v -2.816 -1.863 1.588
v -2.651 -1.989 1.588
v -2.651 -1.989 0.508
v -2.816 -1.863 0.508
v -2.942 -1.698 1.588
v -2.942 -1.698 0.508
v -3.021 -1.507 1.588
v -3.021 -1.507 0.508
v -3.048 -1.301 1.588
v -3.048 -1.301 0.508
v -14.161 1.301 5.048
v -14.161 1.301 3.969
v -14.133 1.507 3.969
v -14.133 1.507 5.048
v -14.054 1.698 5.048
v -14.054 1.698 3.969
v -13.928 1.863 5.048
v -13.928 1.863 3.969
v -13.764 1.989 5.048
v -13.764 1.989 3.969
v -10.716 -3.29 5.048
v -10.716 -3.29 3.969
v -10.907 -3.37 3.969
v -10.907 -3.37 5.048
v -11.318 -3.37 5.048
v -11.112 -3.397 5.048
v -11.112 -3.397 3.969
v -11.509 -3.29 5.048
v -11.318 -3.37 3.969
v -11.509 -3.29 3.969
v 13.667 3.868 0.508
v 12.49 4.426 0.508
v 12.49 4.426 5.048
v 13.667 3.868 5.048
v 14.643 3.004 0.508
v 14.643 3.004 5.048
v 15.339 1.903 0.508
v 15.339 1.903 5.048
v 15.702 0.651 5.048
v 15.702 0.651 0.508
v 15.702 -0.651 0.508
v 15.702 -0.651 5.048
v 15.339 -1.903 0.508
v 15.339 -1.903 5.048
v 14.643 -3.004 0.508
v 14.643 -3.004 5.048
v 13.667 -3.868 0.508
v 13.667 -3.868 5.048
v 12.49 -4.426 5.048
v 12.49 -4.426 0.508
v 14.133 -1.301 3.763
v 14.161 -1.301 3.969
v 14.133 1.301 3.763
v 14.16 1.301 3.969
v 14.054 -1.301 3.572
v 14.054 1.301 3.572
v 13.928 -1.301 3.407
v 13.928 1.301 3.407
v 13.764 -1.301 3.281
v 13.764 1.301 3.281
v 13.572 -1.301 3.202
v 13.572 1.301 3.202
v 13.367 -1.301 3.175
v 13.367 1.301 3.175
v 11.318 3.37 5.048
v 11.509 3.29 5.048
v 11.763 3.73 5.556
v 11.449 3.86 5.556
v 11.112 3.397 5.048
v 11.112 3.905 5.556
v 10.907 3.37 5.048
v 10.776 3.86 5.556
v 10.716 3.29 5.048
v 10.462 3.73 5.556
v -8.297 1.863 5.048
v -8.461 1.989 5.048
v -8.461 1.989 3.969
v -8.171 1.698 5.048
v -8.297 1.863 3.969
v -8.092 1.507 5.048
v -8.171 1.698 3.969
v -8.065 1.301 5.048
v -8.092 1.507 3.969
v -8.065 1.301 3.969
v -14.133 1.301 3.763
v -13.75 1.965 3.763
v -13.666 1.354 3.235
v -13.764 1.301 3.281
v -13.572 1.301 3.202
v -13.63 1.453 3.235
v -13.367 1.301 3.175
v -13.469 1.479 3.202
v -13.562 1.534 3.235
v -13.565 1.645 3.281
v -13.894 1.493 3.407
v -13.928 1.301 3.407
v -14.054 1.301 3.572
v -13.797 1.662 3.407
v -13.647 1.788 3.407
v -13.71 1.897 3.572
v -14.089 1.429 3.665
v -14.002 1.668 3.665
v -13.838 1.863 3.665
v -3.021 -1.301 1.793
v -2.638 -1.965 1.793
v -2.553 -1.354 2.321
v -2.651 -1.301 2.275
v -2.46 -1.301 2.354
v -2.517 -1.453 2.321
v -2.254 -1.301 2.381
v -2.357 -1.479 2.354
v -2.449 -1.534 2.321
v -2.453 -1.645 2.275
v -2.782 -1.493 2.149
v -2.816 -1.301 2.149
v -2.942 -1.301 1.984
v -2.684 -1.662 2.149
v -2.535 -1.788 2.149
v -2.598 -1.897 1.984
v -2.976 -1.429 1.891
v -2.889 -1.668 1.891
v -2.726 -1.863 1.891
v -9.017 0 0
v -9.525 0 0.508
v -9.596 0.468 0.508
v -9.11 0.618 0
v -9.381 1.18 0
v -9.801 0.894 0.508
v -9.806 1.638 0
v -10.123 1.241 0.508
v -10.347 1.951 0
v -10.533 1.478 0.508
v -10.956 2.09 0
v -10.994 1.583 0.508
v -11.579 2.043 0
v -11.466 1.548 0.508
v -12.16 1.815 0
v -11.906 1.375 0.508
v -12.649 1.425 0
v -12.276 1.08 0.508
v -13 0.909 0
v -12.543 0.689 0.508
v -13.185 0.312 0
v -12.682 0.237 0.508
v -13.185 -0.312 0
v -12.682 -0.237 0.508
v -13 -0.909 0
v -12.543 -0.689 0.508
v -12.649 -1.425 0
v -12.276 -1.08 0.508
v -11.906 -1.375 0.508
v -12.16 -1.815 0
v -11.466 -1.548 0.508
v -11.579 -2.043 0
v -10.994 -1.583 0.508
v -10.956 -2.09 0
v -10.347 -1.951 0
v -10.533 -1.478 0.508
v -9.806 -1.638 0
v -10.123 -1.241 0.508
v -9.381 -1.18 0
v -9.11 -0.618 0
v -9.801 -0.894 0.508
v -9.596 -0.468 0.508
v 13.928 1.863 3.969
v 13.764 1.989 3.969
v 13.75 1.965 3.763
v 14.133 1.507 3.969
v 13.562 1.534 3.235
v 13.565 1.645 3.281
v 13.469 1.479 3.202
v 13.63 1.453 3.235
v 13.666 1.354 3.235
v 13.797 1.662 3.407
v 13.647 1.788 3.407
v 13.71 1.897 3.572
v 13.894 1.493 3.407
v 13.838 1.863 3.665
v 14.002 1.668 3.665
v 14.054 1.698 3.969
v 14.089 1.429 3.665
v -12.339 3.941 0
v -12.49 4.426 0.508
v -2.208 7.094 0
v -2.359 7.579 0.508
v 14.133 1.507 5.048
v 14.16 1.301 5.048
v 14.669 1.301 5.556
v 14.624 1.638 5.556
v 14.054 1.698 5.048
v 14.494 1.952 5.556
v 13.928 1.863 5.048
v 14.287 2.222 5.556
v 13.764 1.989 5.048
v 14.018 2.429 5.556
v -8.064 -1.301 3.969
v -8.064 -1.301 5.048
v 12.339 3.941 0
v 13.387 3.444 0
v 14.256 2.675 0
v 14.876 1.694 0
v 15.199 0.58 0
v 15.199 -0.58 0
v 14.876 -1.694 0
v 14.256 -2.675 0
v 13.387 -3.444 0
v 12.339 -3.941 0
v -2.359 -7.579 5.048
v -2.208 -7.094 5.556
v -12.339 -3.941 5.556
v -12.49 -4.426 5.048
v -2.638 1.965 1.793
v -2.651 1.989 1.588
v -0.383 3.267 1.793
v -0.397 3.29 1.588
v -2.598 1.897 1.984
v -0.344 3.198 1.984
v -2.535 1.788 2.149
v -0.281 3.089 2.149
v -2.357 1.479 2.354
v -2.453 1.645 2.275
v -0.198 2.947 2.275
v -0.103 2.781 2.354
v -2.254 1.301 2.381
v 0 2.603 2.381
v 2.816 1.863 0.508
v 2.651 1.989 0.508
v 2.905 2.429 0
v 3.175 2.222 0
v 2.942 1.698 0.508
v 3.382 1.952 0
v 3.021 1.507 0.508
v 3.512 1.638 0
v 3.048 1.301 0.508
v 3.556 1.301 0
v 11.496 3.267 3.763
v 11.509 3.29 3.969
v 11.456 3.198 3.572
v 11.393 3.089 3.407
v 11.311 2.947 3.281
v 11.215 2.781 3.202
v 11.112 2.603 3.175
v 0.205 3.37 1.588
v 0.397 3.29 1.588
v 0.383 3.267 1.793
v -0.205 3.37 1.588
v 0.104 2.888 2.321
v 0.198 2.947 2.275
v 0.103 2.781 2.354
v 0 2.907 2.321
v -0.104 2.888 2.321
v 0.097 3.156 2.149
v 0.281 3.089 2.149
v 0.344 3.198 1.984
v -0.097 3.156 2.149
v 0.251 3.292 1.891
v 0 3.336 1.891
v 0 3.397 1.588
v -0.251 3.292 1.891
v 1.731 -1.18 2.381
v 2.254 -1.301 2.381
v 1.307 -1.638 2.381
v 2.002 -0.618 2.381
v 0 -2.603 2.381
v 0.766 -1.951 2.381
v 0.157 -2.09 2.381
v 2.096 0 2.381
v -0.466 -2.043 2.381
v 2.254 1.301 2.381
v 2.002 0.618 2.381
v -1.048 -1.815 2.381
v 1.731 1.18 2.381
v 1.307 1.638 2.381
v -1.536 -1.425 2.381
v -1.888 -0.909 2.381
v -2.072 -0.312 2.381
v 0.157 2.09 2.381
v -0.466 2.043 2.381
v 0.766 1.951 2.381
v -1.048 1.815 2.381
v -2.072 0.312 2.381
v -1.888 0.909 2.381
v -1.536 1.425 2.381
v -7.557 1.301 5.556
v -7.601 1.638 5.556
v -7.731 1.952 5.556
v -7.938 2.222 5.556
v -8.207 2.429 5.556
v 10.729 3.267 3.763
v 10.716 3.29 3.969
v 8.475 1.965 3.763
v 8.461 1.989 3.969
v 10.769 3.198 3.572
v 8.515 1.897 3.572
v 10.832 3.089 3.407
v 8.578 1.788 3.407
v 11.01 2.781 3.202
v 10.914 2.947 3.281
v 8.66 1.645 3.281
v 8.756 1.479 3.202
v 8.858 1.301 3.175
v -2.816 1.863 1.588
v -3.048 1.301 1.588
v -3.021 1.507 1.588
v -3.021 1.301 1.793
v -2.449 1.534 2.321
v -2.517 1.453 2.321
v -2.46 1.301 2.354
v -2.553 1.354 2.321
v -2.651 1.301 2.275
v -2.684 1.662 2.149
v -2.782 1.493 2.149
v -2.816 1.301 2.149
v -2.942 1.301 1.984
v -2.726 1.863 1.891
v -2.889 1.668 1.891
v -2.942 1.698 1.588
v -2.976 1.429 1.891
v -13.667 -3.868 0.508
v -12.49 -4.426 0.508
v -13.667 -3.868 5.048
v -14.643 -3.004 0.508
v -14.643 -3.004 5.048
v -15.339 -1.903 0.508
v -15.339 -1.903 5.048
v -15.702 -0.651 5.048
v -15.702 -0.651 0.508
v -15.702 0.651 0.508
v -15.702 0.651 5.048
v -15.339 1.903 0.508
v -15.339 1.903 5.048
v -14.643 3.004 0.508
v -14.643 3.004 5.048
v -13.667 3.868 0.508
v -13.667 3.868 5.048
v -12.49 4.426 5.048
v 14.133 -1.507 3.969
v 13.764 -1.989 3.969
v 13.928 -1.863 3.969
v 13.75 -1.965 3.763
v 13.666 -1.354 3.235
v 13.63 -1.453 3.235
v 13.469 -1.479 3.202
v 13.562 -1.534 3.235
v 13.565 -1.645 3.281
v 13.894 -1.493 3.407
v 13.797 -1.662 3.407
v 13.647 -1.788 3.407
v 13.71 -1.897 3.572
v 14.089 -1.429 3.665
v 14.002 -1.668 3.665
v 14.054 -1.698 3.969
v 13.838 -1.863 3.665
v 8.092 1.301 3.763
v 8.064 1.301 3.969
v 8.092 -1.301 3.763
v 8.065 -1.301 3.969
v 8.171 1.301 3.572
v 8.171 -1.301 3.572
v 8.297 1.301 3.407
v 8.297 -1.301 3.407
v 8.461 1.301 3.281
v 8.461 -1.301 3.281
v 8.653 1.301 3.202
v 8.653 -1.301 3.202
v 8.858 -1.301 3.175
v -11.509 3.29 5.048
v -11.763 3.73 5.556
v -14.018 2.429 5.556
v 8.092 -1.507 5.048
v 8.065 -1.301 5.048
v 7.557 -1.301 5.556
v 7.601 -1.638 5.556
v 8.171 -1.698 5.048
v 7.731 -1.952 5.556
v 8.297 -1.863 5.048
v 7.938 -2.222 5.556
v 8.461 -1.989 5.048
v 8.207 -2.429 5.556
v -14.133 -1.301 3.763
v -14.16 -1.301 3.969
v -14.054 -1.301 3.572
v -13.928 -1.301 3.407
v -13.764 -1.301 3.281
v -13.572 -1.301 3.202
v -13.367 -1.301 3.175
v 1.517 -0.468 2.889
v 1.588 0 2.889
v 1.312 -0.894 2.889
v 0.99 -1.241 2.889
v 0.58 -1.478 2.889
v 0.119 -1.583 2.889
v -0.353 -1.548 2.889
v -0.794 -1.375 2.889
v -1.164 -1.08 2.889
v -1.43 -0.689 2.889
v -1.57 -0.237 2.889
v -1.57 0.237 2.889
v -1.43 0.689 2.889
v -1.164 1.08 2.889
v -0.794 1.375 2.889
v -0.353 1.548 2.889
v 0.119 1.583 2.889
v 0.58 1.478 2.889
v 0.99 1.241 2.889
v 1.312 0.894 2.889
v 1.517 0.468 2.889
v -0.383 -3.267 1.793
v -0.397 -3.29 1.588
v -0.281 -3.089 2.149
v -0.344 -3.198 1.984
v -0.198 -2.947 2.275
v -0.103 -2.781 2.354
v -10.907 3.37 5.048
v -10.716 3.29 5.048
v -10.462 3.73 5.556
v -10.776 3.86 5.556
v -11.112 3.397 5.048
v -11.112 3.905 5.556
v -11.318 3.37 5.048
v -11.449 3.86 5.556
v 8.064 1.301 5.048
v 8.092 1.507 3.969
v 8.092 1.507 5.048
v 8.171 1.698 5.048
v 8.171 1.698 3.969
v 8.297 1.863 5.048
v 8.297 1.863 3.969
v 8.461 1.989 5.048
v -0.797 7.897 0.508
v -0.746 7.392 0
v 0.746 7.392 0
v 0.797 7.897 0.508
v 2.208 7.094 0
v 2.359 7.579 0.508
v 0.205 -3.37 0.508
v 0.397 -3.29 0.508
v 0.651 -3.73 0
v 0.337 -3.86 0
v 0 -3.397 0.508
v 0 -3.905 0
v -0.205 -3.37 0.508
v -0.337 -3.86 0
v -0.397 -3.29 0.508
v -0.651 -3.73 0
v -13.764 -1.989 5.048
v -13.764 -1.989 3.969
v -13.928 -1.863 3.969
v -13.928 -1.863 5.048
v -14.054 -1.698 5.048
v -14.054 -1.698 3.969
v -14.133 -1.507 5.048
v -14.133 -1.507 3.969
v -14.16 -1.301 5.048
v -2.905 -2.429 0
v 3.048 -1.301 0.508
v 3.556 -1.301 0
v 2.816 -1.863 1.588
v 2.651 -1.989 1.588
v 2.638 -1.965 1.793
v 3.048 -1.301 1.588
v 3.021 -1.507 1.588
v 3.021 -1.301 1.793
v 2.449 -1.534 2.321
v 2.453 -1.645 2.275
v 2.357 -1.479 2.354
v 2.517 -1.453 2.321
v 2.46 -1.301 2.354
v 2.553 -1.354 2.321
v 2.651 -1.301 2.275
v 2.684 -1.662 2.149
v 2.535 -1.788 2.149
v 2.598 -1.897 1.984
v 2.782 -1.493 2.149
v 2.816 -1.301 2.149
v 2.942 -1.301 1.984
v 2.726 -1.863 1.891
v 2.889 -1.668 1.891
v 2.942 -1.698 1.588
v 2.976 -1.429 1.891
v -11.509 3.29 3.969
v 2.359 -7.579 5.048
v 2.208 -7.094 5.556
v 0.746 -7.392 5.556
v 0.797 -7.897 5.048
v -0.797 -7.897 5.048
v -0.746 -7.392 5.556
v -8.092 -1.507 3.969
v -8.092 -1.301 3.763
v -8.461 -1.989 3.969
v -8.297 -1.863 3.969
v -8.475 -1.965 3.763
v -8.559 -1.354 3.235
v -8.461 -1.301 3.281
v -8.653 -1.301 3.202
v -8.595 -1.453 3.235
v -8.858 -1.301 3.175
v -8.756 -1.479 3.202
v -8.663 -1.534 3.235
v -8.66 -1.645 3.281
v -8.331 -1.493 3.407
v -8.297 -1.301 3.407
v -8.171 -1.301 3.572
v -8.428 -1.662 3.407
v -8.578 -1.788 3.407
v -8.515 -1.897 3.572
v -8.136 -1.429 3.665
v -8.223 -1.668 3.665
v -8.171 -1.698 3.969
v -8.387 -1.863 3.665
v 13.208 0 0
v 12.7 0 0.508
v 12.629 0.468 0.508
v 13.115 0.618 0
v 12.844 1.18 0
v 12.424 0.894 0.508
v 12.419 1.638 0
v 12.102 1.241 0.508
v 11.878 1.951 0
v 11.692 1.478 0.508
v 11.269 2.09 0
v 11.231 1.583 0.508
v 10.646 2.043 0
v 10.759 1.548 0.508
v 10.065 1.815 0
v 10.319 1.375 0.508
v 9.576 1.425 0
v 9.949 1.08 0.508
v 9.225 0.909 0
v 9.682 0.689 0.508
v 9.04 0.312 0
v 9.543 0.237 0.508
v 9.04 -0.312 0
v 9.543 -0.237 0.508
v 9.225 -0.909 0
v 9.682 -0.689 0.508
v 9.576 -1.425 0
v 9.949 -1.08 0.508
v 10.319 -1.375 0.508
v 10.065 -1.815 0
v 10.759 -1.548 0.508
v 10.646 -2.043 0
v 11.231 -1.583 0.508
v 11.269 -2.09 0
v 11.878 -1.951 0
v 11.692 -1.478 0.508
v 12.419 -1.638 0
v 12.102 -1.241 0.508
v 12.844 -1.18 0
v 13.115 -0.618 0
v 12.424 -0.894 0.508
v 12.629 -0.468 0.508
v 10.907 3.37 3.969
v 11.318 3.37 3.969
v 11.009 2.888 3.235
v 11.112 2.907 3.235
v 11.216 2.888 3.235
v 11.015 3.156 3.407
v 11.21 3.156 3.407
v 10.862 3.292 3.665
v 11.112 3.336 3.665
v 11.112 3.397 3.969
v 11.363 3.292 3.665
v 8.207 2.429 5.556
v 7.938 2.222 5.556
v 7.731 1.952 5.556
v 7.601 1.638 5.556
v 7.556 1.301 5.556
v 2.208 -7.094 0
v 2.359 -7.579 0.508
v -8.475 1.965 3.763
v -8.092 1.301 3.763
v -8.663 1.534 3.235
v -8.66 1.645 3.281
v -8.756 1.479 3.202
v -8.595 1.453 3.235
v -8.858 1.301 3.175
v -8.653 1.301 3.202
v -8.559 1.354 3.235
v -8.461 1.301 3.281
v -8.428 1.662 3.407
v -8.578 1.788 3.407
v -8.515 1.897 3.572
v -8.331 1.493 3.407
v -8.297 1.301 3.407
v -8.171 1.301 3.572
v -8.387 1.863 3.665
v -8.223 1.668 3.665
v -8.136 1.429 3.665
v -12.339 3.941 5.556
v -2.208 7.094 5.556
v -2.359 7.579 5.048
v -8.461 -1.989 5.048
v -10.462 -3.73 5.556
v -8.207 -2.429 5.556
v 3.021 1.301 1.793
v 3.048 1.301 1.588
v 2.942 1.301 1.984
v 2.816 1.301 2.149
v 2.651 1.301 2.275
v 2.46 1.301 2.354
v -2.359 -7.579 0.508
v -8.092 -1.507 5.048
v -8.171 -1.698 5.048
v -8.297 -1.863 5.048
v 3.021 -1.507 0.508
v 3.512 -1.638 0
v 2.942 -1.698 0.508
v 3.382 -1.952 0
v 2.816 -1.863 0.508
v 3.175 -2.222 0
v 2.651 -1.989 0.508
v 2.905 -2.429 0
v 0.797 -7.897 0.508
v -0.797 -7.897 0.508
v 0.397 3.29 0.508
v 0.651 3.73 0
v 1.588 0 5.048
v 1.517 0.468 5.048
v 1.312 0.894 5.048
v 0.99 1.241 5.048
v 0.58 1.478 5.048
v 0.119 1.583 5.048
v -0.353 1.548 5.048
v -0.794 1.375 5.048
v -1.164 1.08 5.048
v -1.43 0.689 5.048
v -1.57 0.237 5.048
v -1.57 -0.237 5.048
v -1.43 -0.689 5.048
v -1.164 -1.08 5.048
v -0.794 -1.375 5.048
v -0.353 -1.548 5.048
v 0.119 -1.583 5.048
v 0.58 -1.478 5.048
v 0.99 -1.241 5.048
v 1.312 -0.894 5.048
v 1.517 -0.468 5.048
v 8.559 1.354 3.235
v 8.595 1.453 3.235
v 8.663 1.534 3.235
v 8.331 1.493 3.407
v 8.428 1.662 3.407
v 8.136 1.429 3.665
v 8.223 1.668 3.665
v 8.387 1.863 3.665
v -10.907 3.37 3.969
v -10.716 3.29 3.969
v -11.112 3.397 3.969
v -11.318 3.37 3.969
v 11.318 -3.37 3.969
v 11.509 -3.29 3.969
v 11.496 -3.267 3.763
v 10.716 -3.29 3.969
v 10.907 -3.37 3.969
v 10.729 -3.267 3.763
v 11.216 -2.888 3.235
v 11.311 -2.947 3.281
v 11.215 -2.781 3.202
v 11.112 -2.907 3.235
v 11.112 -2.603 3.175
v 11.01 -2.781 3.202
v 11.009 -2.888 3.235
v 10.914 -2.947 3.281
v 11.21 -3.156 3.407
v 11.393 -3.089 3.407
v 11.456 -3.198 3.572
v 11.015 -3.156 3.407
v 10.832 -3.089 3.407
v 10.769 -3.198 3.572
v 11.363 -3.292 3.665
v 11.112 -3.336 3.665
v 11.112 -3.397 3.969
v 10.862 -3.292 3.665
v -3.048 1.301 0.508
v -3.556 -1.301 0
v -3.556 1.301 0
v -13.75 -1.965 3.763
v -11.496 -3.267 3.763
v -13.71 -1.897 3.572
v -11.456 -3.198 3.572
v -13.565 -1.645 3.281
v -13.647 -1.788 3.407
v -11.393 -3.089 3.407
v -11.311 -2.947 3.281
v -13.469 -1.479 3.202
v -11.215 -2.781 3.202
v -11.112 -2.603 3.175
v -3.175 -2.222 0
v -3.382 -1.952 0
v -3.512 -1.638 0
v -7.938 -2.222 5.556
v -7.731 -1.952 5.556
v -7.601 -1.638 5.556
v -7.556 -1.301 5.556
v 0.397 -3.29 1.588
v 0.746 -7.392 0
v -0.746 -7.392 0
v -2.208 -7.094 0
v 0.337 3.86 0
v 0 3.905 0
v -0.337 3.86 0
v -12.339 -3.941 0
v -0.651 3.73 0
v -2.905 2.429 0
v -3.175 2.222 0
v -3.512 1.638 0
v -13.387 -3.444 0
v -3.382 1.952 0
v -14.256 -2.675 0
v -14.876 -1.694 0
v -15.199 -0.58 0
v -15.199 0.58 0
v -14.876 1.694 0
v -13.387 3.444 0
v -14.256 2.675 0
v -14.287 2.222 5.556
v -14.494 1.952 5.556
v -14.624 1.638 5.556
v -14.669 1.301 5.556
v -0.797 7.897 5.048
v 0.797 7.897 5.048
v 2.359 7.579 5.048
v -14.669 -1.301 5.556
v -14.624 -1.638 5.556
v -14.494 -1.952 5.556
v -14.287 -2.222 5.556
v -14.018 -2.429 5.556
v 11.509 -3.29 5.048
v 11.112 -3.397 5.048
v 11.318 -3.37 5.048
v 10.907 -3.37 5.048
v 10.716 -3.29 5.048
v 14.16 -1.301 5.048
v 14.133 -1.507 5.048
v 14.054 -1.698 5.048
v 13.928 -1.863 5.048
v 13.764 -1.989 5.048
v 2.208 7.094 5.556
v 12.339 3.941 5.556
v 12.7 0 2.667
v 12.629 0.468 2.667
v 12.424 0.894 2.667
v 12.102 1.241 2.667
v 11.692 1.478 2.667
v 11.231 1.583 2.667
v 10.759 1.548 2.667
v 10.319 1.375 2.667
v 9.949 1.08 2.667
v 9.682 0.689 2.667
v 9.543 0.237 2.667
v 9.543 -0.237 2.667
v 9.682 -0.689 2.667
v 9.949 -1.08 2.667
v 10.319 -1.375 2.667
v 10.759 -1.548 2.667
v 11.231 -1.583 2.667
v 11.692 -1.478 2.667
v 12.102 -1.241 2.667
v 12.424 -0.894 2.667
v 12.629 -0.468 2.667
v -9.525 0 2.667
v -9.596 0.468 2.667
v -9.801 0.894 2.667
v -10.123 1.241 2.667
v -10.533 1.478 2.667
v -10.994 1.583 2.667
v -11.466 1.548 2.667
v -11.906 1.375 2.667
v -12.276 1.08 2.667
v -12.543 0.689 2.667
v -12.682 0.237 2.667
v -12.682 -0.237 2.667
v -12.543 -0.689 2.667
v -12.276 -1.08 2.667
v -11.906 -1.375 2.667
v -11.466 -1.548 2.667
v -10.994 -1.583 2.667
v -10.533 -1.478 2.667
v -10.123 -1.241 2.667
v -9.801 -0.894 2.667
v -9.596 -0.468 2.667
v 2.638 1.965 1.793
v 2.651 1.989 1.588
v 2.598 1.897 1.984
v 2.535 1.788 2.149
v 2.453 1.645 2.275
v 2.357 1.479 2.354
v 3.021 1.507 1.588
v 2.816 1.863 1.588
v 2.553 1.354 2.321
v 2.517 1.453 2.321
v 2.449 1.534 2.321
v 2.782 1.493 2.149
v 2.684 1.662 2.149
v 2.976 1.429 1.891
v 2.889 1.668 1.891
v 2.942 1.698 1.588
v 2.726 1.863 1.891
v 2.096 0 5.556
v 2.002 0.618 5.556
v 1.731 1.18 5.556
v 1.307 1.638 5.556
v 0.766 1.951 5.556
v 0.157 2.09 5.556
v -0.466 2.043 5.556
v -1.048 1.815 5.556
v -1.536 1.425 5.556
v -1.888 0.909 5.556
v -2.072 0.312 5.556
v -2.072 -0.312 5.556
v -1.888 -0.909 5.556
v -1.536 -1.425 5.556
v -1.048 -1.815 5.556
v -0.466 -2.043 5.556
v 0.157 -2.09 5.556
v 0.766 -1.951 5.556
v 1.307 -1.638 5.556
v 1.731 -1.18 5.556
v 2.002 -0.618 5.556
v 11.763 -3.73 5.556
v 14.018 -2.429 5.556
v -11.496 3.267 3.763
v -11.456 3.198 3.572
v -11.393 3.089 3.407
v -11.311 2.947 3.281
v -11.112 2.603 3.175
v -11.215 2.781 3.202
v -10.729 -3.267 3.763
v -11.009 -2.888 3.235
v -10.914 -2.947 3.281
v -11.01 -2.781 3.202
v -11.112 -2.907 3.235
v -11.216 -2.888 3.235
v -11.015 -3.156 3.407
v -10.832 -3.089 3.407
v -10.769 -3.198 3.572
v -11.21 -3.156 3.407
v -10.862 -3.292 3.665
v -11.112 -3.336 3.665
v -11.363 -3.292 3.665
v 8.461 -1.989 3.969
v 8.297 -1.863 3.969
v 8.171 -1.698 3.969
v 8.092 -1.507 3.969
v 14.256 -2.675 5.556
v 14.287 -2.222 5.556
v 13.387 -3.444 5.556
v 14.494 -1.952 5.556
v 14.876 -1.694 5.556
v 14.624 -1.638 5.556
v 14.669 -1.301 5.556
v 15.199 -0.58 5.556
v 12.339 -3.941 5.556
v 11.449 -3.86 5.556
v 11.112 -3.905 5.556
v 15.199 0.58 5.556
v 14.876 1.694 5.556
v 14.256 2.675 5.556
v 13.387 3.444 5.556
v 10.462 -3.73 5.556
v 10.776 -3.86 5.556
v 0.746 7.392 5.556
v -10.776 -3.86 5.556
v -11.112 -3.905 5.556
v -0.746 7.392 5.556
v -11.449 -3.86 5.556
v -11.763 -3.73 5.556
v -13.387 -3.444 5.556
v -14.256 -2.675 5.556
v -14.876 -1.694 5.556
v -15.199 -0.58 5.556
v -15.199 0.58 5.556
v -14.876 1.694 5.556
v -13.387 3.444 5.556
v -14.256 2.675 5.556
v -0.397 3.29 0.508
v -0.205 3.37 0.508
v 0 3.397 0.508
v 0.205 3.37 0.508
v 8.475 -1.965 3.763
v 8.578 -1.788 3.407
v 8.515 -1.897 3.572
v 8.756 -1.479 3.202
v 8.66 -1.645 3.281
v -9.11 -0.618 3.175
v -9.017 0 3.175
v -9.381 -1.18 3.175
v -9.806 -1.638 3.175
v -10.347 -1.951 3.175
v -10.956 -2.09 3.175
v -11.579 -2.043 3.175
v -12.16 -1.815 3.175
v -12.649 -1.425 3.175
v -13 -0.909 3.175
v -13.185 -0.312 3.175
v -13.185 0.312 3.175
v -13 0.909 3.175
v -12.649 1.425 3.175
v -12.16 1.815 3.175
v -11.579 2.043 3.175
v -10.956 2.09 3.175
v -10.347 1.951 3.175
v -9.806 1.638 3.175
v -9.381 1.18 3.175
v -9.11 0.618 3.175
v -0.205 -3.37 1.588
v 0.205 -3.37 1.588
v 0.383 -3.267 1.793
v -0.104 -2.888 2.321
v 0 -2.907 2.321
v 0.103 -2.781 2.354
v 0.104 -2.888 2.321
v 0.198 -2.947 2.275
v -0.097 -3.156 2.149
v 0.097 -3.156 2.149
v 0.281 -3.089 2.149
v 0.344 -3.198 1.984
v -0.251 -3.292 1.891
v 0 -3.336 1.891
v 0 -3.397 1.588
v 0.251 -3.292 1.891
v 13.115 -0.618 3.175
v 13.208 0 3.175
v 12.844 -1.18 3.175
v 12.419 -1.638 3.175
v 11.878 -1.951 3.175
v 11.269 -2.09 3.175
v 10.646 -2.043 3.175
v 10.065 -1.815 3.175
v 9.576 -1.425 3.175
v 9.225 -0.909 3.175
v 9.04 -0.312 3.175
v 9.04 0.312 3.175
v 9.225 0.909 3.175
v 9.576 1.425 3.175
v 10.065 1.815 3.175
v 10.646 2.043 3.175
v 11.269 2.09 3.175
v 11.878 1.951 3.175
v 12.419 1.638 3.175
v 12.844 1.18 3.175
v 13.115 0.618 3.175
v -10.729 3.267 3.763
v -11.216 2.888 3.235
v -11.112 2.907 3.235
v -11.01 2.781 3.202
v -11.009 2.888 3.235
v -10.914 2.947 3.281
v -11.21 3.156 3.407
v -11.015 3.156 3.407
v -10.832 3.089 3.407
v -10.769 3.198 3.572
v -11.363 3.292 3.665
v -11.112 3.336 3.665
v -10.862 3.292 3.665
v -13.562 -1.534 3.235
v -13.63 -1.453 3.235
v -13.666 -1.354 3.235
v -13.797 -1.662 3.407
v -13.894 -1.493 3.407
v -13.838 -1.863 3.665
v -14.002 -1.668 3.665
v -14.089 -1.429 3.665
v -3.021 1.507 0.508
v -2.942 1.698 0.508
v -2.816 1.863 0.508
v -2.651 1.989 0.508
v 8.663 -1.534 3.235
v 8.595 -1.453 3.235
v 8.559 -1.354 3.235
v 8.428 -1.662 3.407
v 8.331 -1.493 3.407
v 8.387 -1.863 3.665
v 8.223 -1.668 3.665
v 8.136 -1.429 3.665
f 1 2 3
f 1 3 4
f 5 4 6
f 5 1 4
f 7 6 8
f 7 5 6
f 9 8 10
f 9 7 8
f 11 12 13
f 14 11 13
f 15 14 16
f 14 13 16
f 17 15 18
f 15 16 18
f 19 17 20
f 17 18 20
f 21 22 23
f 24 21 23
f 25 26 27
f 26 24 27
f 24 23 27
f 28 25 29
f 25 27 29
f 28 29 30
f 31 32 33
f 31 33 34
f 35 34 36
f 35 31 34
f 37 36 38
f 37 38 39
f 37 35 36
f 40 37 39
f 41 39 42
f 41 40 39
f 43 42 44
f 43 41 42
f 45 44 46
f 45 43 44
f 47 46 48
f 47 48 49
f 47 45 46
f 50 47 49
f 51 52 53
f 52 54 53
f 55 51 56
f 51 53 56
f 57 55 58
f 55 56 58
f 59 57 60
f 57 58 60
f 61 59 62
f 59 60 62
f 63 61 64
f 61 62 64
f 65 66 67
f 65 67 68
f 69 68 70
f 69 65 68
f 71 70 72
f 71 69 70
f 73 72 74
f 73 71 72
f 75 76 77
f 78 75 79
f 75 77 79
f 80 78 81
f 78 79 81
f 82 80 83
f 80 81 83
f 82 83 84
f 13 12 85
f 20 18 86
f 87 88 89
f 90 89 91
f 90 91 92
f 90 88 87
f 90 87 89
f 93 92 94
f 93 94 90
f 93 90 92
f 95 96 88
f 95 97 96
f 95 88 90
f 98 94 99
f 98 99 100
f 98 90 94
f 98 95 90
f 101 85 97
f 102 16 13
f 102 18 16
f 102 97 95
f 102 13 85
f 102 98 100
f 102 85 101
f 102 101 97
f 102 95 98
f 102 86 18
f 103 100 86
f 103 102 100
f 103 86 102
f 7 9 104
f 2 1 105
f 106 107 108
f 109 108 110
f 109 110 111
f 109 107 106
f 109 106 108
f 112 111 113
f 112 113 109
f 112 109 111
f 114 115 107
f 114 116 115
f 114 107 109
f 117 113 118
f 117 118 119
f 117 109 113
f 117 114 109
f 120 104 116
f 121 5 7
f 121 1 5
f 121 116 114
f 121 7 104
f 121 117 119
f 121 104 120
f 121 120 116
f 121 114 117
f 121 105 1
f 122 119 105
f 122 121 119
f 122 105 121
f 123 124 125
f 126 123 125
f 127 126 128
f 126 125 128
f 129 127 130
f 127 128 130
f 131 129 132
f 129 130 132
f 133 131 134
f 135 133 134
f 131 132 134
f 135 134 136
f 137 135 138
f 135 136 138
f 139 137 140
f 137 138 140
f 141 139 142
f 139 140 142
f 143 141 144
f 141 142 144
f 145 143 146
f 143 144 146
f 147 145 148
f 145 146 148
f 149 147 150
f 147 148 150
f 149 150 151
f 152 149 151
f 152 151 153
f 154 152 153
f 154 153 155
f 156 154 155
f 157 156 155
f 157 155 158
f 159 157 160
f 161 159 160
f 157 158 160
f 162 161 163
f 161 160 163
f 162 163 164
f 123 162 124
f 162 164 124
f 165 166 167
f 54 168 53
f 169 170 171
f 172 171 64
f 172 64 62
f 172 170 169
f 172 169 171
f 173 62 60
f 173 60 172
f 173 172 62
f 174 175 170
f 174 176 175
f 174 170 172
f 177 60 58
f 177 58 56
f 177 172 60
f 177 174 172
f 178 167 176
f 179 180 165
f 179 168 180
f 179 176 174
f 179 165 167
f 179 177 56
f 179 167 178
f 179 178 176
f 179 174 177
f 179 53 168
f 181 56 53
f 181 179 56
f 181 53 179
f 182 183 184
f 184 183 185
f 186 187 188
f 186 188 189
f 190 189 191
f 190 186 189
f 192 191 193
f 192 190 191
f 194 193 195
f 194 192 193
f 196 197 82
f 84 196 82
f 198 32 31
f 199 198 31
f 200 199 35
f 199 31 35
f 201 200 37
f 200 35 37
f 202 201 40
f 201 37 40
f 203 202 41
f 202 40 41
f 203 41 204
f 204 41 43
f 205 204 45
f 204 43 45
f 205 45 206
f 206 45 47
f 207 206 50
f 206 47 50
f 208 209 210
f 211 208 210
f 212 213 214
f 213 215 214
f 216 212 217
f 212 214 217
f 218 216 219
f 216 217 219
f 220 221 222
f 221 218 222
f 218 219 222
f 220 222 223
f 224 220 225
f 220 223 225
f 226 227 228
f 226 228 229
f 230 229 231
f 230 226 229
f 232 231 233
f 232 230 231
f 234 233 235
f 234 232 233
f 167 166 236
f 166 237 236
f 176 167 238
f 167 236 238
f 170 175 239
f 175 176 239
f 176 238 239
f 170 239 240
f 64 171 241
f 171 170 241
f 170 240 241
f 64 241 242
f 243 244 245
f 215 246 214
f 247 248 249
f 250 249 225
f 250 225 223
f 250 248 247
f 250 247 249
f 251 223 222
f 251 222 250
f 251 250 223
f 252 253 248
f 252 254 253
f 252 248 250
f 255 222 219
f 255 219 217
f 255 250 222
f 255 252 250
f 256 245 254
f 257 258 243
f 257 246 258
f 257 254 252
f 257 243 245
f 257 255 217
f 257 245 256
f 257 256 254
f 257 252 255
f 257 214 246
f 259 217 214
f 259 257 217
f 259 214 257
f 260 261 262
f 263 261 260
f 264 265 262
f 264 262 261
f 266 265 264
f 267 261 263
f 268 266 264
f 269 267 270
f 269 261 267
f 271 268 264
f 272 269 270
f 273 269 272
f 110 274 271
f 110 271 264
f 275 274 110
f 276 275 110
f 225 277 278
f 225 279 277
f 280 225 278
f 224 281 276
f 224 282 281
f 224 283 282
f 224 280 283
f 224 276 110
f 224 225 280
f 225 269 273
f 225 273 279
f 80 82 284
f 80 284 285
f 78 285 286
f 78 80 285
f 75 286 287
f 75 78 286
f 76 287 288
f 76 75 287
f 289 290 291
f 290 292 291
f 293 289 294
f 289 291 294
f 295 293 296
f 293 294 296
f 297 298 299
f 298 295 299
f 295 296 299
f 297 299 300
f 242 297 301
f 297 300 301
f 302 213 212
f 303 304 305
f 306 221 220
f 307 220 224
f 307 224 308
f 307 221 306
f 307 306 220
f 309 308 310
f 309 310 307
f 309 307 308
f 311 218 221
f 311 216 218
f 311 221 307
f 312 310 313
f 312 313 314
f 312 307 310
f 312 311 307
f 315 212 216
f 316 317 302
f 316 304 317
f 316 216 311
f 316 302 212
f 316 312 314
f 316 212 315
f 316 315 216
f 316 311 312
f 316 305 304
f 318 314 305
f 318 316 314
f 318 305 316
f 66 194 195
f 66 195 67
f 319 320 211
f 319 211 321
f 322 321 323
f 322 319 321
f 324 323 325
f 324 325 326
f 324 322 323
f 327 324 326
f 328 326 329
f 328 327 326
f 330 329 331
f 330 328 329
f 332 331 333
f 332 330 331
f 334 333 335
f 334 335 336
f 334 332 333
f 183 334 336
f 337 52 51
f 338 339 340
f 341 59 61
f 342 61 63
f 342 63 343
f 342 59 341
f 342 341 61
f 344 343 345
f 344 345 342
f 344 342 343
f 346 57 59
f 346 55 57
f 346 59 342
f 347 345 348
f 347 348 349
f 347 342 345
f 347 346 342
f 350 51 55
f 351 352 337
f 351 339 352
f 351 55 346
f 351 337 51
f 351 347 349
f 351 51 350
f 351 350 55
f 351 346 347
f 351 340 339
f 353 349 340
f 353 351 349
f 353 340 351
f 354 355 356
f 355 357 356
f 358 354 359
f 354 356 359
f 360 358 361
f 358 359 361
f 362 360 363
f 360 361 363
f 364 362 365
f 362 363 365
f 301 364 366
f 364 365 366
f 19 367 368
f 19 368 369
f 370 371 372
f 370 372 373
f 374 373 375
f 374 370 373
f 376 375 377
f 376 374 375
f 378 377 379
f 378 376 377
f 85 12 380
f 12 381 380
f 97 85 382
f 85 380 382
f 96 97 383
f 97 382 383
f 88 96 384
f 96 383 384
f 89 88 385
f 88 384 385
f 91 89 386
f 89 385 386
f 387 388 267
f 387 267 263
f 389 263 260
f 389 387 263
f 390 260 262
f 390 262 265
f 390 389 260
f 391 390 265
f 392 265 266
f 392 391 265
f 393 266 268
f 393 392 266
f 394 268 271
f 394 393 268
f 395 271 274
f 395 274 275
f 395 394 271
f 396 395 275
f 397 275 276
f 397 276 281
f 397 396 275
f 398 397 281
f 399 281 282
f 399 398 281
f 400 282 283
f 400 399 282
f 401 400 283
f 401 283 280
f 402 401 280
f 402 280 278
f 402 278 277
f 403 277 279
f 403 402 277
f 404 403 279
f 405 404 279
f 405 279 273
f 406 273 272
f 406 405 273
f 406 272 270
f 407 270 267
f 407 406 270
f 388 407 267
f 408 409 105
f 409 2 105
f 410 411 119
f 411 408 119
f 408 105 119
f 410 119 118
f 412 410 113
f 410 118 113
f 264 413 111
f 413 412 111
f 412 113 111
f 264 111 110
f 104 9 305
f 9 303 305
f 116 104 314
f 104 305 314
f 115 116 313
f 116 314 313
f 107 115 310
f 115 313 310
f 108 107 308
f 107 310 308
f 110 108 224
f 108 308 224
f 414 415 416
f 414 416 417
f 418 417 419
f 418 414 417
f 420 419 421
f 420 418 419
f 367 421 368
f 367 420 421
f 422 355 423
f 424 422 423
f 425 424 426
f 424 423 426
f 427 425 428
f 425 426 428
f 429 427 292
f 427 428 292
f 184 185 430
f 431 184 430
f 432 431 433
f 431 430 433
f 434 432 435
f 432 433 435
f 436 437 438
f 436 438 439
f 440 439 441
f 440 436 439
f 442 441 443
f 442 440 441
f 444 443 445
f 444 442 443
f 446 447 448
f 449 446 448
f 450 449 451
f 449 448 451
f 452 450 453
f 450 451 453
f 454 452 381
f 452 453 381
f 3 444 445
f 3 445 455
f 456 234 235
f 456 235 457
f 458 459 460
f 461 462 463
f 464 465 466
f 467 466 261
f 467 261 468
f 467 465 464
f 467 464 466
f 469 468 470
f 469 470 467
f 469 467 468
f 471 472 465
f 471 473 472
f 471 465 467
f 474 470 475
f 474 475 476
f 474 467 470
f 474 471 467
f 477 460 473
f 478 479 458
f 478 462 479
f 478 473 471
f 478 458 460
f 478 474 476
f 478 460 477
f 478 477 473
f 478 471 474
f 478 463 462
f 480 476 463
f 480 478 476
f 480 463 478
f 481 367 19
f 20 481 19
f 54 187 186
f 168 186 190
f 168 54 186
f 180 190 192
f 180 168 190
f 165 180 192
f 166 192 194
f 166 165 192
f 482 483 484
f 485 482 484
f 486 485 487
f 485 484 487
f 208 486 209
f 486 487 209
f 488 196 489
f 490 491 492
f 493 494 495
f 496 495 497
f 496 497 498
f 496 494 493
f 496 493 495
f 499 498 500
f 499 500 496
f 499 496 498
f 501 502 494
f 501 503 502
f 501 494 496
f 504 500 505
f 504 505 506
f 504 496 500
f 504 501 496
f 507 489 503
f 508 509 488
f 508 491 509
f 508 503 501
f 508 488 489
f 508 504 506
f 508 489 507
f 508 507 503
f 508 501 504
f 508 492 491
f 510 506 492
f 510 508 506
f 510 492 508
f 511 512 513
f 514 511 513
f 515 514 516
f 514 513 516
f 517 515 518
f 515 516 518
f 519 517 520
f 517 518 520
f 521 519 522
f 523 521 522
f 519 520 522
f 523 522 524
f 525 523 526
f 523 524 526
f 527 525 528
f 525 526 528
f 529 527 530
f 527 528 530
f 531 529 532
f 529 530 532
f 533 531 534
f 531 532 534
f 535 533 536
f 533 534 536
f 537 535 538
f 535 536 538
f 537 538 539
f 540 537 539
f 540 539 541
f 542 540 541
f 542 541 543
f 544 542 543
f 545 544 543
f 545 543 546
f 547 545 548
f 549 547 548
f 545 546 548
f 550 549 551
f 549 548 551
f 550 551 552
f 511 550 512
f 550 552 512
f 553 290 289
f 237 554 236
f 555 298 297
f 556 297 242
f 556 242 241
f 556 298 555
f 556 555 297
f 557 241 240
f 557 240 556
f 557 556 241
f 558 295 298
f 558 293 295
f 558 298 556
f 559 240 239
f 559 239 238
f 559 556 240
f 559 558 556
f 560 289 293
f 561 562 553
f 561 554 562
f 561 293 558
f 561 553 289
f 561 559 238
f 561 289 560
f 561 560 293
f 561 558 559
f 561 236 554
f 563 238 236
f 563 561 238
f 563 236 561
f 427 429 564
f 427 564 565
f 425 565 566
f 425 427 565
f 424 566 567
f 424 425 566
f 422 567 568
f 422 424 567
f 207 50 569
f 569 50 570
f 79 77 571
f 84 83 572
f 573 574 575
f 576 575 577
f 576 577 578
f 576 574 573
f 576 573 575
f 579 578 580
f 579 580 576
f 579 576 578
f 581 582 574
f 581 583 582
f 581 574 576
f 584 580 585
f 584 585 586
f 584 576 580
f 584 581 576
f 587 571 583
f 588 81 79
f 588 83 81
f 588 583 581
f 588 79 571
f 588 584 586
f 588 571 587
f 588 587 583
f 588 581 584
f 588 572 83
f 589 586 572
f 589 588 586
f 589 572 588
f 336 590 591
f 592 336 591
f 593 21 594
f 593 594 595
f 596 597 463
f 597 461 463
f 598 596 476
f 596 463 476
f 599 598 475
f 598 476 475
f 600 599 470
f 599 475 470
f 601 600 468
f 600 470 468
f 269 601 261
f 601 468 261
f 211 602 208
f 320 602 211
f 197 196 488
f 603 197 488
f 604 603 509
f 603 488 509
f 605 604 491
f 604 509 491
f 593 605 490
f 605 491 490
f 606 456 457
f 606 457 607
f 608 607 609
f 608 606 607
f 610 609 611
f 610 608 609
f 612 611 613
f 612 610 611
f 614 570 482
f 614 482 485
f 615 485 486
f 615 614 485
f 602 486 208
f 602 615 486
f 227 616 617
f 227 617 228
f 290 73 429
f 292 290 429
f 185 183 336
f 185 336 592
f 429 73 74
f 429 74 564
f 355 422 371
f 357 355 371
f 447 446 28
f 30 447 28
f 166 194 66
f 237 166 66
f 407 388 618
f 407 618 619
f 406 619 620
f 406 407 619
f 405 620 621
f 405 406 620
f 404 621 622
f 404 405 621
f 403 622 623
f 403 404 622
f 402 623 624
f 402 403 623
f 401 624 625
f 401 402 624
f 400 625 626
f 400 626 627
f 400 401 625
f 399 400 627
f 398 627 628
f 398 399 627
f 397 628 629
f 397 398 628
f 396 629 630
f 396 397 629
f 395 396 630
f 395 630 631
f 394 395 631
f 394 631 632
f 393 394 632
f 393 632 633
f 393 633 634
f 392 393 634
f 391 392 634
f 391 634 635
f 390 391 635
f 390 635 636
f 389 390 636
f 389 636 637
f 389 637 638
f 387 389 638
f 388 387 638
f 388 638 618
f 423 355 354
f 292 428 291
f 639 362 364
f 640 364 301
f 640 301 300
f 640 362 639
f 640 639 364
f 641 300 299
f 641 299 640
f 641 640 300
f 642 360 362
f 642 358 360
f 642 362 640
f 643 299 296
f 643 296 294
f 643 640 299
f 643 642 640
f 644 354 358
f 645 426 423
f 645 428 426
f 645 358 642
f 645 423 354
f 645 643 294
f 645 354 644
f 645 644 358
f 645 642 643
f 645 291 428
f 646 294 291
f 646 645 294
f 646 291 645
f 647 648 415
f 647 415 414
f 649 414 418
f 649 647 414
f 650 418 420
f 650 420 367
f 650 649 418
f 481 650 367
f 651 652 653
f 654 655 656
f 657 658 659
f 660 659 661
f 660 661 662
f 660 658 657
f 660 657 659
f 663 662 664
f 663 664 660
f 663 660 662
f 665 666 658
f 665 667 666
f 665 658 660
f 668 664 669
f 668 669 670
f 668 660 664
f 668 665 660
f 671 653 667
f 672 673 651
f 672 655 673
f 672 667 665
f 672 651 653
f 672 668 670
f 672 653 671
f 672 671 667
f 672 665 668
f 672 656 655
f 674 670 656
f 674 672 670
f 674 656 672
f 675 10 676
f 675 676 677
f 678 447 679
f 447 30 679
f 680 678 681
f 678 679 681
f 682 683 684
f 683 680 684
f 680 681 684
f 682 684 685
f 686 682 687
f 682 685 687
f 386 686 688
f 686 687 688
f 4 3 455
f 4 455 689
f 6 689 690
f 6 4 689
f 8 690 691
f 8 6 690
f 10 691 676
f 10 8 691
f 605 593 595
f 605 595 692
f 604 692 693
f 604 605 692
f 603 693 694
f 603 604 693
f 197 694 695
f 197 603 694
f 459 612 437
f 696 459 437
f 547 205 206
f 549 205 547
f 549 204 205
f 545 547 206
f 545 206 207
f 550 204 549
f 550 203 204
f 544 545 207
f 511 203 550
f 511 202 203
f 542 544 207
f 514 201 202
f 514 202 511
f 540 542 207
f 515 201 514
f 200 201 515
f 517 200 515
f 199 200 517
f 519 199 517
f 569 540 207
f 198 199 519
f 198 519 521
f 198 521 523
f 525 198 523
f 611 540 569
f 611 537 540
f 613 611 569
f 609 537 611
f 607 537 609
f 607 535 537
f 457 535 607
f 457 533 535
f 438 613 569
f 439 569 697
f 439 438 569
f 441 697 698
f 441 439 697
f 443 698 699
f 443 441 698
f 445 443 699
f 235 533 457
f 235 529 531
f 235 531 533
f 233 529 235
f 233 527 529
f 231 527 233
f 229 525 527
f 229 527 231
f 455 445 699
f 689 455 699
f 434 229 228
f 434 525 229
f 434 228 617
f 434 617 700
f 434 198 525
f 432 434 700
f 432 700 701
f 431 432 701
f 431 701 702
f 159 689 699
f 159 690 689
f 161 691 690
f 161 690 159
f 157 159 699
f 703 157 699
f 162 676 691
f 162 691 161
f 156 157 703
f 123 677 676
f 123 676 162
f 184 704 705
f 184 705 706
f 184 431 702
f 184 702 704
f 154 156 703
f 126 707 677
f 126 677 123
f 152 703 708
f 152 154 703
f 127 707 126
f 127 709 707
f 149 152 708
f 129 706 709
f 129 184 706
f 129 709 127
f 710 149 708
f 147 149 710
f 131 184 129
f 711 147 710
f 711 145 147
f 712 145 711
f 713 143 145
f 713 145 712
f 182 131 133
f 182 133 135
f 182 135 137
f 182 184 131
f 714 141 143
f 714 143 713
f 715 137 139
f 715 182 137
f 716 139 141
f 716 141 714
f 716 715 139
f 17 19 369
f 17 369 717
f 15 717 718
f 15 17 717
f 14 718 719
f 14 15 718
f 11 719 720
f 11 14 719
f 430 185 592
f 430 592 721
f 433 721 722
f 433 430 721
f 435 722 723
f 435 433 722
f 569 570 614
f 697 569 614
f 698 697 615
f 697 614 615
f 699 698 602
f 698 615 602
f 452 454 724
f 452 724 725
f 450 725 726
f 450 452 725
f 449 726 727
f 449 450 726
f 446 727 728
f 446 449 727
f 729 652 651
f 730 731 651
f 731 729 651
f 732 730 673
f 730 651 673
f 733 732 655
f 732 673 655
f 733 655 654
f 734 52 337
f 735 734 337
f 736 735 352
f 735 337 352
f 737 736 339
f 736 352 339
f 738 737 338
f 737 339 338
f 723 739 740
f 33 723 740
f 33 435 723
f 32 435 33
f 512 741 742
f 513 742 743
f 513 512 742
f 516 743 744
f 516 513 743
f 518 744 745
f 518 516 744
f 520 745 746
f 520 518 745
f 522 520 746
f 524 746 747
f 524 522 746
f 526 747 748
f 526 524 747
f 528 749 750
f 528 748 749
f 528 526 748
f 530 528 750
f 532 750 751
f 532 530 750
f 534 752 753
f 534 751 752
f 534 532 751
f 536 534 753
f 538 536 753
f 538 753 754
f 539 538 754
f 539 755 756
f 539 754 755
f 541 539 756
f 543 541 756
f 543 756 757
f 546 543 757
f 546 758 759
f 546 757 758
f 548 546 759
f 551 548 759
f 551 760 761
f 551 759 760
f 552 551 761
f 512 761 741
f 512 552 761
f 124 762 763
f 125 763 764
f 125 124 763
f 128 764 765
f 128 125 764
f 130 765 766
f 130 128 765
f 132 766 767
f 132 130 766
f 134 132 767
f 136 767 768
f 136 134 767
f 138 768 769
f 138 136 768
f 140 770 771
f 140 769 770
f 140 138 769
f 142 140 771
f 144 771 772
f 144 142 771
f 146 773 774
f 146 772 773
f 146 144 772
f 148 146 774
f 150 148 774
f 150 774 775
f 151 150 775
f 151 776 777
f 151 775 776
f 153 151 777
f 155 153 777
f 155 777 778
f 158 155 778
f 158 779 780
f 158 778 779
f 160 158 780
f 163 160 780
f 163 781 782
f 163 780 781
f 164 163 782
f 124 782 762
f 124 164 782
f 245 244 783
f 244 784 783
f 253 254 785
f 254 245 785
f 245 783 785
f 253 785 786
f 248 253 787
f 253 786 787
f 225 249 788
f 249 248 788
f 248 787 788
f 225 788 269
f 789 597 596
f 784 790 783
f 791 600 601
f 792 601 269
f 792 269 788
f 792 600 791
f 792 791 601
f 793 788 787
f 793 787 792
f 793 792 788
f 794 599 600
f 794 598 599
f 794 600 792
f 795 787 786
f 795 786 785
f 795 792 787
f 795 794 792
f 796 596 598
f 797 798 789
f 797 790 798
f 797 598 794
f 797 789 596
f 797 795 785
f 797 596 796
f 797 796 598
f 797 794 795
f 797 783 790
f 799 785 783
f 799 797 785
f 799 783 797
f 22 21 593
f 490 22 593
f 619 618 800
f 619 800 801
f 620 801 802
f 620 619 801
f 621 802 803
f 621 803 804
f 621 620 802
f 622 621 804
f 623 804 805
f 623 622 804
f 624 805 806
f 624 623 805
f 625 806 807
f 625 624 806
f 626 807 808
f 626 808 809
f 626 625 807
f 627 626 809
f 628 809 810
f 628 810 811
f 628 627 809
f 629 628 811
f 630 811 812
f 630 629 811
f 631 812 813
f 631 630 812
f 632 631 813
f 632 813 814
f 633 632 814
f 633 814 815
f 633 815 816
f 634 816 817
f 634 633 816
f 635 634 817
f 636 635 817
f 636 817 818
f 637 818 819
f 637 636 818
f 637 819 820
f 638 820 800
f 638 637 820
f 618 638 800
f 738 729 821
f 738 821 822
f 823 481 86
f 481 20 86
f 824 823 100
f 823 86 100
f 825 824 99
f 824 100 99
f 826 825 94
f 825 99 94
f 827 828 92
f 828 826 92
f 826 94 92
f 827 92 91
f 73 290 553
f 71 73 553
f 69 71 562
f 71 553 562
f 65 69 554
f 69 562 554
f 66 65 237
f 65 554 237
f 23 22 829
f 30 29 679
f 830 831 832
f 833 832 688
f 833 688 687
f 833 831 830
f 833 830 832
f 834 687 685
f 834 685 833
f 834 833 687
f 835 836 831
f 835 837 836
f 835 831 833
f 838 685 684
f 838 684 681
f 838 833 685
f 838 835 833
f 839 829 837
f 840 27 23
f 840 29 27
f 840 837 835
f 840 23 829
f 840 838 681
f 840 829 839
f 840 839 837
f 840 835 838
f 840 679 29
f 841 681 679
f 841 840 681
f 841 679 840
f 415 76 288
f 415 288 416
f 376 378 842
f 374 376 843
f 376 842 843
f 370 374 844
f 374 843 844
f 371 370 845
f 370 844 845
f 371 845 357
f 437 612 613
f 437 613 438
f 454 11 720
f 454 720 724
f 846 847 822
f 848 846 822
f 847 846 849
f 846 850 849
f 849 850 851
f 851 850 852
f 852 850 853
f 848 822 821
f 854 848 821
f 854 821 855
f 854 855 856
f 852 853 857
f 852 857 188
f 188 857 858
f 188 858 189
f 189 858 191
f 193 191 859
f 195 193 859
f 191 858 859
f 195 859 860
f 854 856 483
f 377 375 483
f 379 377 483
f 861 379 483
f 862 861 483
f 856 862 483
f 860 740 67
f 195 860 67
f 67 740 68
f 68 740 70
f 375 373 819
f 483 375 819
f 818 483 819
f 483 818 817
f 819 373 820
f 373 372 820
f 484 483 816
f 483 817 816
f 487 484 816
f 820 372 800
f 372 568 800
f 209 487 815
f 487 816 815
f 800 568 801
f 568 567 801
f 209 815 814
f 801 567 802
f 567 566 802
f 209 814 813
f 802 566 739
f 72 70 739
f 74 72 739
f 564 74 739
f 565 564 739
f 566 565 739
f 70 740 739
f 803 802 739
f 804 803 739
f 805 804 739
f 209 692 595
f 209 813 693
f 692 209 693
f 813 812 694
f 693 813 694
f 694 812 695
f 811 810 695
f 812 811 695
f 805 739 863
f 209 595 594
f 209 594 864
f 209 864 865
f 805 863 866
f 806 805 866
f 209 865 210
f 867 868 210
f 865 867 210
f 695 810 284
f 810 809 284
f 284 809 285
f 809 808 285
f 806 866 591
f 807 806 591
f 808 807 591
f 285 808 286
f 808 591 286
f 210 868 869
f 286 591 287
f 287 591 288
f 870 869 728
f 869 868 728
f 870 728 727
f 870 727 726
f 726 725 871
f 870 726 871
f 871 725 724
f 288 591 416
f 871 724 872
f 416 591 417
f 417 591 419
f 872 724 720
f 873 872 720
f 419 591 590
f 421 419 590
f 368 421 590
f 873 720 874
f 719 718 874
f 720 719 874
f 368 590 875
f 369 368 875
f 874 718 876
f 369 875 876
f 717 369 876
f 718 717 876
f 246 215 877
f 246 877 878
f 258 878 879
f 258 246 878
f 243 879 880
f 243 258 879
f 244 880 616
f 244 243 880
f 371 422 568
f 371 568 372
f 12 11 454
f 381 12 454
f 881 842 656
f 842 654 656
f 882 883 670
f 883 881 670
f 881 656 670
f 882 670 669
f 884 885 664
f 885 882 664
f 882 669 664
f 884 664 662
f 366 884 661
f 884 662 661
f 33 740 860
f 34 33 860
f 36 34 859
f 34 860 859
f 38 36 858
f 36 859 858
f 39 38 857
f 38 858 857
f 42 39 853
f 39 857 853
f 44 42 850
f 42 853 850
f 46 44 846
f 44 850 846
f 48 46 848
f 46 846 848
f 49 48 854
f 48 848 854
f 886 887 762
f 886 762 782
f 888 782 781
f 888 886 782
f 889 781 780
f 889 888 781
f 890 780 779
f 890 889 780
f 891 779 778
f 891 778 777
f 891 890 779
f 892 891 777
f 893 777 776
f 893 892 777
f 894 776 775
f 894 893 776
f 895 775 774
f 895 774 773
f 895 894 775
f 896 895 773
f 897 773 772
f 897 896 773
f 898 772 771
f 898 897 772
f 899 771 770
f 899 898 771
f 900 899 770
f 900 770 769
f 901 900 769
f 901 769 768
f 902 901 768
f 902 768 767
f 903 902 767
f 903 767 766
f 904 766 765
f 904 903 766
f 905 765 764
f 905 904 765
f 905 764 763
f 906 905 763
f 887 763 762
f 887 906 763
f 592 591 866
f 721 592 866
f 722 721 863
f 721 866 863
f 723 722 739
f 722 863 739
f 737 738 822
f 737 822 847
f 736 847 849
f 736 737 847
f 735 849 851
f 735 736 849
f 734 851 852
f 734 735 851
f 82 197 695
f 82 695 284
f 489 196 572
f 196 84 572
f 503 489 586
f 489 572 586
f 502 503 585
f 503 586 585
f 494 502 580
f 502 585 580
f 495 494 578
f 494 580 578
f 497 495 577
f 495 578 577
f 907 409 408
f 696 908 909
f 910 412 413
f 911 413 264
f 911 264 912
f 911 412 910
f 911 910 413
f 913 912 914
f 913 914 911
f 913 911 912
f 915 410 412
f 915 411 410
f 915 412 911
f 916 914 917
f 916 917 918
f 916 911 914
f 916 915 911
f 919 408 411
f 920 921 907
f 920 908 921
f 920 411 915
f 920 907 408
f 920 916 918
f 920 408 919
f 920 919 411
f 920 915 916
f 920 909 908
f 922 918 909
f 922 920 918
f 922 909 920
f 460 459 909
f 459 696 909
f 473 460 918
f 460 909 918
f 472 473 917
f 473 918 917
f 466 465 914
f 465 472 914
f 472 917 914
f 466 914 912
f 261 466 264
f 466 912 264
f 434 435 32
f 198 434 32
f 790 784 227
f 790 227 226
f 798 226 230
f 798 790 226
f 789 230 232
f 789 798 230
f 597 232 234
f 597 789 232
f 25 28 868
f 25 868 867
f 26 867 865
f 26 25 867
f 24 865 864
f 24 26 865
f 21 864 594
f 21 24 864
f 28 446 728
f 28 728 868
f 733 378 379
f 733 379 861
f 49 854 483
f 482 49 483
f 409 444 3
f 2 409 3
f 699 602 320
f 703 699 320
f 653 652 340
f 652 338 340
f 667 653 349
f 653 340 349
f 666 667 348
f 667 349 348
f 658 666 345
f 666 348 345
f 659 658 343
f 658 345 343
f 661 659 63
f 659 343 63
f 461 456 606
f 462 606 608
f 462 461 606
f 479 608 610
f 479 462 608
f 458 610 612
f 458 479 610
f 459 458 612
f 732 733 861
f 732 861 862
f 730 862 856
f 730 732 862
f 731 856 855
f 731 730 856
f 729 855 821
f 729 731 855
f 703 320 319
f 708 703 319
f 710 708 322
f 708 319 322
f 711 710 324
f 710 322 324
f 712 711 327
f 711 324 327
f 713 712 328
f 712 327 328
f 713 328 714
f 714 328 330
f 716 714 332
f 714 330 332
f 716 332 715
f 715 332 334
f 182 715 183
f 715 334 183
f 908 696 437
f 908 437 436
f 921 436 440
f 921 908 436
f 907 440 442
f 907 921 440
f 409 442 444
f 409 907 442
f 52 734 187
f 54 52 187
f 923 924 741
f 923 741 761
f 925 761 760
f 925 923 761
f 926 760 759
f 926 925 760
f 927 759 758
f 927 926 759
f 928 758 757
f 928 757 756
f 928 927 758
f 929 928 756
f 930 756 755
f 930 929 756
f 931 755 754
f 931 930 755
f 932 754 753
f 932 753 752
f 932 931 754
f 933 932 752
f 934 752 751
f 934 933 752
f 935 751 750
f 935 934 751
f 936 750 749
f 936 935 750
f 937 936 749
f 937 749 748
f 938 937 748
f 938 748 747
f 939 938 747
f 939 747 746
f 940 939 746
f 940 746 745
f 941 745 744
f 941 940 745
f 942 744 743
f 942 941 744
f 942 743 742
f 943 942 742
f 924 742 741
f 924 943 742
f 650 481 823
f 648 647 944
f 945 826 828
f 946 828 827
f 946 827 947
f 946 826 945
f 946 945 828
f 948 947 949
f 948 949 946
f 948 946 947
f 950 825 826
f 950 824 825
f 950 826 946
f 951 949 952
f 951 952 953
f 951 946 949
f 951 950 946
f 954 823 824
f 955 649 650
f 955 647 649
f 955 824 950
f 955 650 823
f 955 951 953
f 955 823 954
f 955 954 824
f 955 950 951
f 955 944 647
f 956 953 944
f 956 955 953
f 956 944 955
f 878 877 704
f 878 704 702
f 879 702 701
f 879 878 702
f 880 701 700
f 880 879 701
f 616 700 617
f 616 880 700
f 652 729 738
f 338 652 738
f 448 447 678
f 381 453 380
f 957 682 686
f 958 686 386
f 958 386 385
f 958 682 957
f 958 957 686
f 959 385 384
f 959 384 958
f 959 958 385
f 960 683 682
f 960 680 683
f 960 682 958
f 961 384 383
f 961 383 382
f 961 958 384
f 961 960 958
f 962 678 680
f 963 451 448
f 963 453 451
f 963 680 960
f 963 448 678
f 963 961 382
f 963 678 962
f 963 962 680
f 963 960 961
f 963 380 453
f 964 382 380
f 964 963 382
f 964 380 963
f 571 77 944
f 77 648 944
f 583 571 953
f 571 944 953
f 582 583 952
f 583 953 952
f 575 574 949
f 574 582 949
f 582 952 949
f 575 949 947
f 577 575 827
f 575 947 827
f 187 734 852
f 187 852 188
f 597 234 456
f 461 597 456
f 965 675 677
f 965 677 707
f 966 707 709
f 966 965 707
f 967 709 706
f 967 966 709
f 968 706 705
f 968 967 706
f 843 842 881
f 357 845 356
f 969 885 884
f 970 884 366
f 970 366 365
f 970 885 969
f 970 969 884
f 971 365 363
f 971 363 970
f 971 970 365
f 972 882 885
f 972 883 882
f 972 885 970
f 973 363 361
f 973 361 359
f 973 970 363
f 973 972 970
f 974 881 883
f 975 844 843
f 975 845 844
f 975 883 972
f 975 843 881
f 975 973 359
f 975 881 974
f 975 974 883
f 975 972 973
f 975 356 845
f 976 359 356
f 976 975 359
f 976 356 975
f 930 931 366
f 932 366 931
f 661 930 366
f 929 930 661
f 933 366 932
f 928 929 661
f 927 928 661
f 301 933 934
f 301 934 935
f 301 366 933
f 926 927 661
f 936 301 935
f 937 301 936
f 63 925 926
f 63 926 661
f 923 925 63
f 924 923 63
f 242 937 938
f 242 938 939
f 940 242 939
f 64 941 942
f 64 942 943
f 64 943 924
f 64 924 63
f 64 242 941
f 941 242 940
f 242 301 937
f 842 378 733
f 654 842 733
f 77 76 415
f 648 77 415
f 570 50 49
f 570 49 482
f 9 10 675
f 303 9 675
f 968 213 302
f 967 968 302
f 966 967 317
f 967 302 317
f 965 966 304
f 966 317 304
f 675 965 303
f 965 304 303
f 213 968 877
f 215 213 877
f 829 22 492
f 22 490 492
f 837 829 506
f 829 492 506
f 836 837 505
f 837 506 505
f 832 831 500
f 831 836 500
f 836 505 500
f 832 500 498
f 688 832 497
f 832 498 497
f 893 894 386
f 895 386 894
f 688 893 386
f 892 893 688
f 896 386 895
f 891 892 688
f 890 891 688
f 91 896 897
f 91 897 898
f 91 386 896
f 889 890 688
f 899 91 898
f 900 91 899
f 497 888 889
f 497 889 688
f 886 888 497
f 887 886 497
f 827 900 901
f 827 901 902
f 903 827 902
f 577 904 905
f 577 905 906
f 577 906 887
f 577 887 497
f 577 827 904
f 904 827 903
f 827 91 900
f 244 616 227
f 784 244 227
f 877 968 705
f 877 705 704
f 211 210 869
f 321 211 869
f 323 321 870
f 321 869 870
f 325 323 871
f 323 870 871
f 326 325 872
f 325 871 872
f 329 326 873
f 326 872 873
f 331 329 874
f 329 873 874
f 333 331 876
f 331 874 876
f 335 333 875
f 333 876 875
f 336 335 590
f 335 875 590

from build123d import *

# Parameters (mm, degrees)
SKETCH10_R          = 1.5875
BOSS_EXTRUDE2_DEPTH = 5.55625
CUT_EXTRUDE5_DEPTH  = 2.38125
CUT_EXTRUDE6_DEPTH  = 2.38125
FILLET2_R           = 0.79375
CHAMFER2_SIZE       = 0.508


with BuildPart() as part:
    # Sketch10 → Boss-Extrude2 (new body)
    with BuildSketch(Plane.XY):
        with BuildLine():
            Line((-12.489905714, 4.426128528), (-2.358571429, 7.578987206))
            ThreePointArc((-2.358571429, 7.578987206), (0, 7.9375), (2.358571429, 7.578987206))
            Line((2.358571429, 7.578987206), (12.489905714, 4.426128528))
            ThreePointArc((12.489905714, 4.426128528), (15.748, 0), (12.489905714, -4.426128528))
            Line((12.489905714, -4.426128528), (2.358571429, -7.578987206))
            ThreePointArc((2.358571429, -7.578987206), (0, -7.9375), (-2.358571429, -7.578987206))
            Line((-2.358571429, -7.578987206), (-12.489905714, -4.426128528))
            ThreePointArc((-12.489905714, -4.426128528), (-15.748, 0), (-12.489905714, 4.426128528))
        make_face()
        Circle(SKETCH10_R, mode=Mode.SUBTRACT)
        with Locations((-11.1125, 0)):
            Circle(SKETCH10_R, mode=Mode.SUBTRACT)
        with Locations((11.1125, 0)):
            Circle(SKETCH10_R, mode=Mode.SUBTRACT)
    extrude(amount=BOSS_EXTRUDE2_DEPTH)

    # Sketch11 → Cut-Extrude5 (cut)
    with BuildSketch(Plane.XY.offset(5.55625)):
        Polygon((-11.1125, 3.519527241), (-14.1605, 1.75976362), (-14.1605, -1.75976362), (-11.1125, -3.519527241), (-8.0645, -1.75976362), (-8.0645, 1.75976362), align=None)
        Polygon((14.1605, 1.75976362), (11.1125, 3.519527241), (8.0645, 1.75976362), (8.0645, -1.75976362), (11.1125, -3.519527241), (14.1605, -1.75976362), align=None)
    extrude(amount=-CUT_EXTRUDE5_DEPTH, mode=Mode.SUBTRACT)

    # Sketch12 → Cut-Extrude6 (cut)
    with BuildSketch(Plane(origin=(0, 0, 0), x_dir=(-1, 0, 0), z_dir=(0, 0, -1))):
        Polygon((3.048, 1.75976362), (0, 3.519527241), (-3.048, 1.75976362), (-3.048, -1.75976362), (0, -3.519527241), (3.048, -1.75976362), align=None)
    extrude(amount=-CUT_EXTRUDE6_DEPTH, mode=Mode.SUBTRACT)

    # Fillet2
    fillet2_edges = [part.edges().sort_by_distance(p)[0] for p in [
        (-9.5885, 2.639645431, 3.175),
        (-11.1125, 3.519527241, 4.365625),
        (-8.0645, 0, 3.175),
        (-8.0645, 1.75976362, 4.365625),
        (-9.5885, -2.639645431, 3.175),
        (-8.0645, -1.75976362, 4.365625),
        (-12.6365, -2.639645431, 3.175),
        (-11.1125, -3.519527241, 4.365625),
        (-14.1605, 0, 3.175),
        (-14.1605, -1.75976362, 4.365625),
        (-12.6365, 2.639645431, 3.175),
        (-14.1605, 1.75976362, 4.365625),
        (14.1605, 0, 3.175),
        (14.1605, 1.75976362, 4.365625),
        (12.6365, -2.639645431, 3.175),
        (14.1605, -1.75976362, 4.365625),
        (9.5885, -2.639645431, 3.175),
        (11.1125, -3.519527241, 4.365625),
        (8.0645, 0, 3.175),
        (8.0645, -1.75976362, 4.365625),
        (9.5885, 2.639645431, 3.175),
        (8.0645, 1.75976362, 4.365625),
        (12.6365, 2.639645431, 3.175),
        (11.1125, 3.519527241, 4.365625),
        (-3.048, 0, 2.38125),
        (-3.048, 1.75976362, 1.190625),
        (-1.524, -2.639645431, 2.38125),
        (-3.048, -1.75976362, 1.190625),
        (1.524, -2.639645431, 2.38125),
        (0, -3.519527241, 1.190625),
        (3.048, 0, 2.38125),
        (3.048, -1.75976362, 1.190625),
        (1.524, 2.639645431, 2.38125),
        (3.048, 1.75976362, 1.190625),
        (-1.524, 2.639645431, 2.38125),
        (0, 3.519527241, 1.190625),
    ]]
    fillet(fillet2_edges, radius=FILLET2_R)

    # Chamfer2
    chamfer2_edges = [part.edges().sort_by_distance(p)[0] for p in [
        (7.424238571, -6.002557867, 0),
        (0, -7.9375, 0),
        (-1.524, 2.639645431, 0),
        (1.524, 2.639645431, 0),
        (-7.424238571, -6.002557867, 0),
        (3.048, 0, 0),
        (1.524, -2.639645431, 0),
        (-15.748, 0, 0),
        (-1.524, -2.639645431, 0),
        (-3.048, 0, 0),
        (14.1605, 0, 5.55625),
        (12.6365, 2.639645431, 5.55625),
        (9.5885, 2.639645431, 5.55625),
        (8.0645, 0, 5.55625),
        (0, -7.9375, 5.55625),
        (9.5885, -2.639645431, 5.55625),
        (12.6365, -2.639645431, 5.55625),
        (-9.5885, 2.639645431, 5.55625),
        (-12.6365, 2.639645431, 5.55625),
        (-14.1605, 0, 5.55625),
        (-12.6365, -2.639645431, 5.55625),
        (-9.5885, -2.639645431, 5.55625),
        (-8.0645, 0, 5.55625),
        (-2.941657664, 1.698366844, 0),
        (0, 3.396733689, 0),
        (2.941657664, 1.698366844, 0),
        (2.941657664, -1.698366844, 0),
        (0, -3.396733689, 0),
        (-2.941657664, -1.698366844, 0),
        (14.054157664, 1.698366844, 5.55625),
        (11.1125, 3.396733689, 5.55625),
        (8.170842336, 1.698366844, 5.55625),
        (8.170842336, -1.698366844, 5.55625),
        (11.1125, -3.396733689, 5.55625),
        (14.054157664, -1.698366844, 5.55625),
        (-11.1125, 3.396733689, 5.55625),
        (-14.054157664, 1.698366844, 5.55625),
        (-11.1125, -3.396733689, 5.55625),
        (-8.170842336, -1.698366844, 5.55625),
        (-8.170842336, 1.698366844, 5.55625),
        (-14.054157664, -1.698366844, 5.55625),
        (7.424238571, -6.002557867, 5.55625),
        (15.748, 0, 5.55625),
        (-1.5875, 0, 5.55625),
        (7.424238571, 6.002557867, 5.55625),
        (-12.7, 0, 0),
        (0, 7.9375, 5.55625),
        (9.525, 0, 0),
        (-7.424238571, 6.002557867, 5.55625),
        (-12.7, 0, 3.175),
        (-15.748, 0, 5.55625),
        (9.525, 0, 3.175),
        (-1.5875, 0, 2.38125),
        (-7.424238571, 6.002557867, 0),
        (-7.424238571, -6.002557867, 5.55625),
        (0, 7.9375, 0),
        (7.424238571, 6.002557867, 0),
        (15.748, 0, 0),
    ]]
    chamfer(chamfer2_edges, length=CHAMFER2_SIZE)


solid = part.part
